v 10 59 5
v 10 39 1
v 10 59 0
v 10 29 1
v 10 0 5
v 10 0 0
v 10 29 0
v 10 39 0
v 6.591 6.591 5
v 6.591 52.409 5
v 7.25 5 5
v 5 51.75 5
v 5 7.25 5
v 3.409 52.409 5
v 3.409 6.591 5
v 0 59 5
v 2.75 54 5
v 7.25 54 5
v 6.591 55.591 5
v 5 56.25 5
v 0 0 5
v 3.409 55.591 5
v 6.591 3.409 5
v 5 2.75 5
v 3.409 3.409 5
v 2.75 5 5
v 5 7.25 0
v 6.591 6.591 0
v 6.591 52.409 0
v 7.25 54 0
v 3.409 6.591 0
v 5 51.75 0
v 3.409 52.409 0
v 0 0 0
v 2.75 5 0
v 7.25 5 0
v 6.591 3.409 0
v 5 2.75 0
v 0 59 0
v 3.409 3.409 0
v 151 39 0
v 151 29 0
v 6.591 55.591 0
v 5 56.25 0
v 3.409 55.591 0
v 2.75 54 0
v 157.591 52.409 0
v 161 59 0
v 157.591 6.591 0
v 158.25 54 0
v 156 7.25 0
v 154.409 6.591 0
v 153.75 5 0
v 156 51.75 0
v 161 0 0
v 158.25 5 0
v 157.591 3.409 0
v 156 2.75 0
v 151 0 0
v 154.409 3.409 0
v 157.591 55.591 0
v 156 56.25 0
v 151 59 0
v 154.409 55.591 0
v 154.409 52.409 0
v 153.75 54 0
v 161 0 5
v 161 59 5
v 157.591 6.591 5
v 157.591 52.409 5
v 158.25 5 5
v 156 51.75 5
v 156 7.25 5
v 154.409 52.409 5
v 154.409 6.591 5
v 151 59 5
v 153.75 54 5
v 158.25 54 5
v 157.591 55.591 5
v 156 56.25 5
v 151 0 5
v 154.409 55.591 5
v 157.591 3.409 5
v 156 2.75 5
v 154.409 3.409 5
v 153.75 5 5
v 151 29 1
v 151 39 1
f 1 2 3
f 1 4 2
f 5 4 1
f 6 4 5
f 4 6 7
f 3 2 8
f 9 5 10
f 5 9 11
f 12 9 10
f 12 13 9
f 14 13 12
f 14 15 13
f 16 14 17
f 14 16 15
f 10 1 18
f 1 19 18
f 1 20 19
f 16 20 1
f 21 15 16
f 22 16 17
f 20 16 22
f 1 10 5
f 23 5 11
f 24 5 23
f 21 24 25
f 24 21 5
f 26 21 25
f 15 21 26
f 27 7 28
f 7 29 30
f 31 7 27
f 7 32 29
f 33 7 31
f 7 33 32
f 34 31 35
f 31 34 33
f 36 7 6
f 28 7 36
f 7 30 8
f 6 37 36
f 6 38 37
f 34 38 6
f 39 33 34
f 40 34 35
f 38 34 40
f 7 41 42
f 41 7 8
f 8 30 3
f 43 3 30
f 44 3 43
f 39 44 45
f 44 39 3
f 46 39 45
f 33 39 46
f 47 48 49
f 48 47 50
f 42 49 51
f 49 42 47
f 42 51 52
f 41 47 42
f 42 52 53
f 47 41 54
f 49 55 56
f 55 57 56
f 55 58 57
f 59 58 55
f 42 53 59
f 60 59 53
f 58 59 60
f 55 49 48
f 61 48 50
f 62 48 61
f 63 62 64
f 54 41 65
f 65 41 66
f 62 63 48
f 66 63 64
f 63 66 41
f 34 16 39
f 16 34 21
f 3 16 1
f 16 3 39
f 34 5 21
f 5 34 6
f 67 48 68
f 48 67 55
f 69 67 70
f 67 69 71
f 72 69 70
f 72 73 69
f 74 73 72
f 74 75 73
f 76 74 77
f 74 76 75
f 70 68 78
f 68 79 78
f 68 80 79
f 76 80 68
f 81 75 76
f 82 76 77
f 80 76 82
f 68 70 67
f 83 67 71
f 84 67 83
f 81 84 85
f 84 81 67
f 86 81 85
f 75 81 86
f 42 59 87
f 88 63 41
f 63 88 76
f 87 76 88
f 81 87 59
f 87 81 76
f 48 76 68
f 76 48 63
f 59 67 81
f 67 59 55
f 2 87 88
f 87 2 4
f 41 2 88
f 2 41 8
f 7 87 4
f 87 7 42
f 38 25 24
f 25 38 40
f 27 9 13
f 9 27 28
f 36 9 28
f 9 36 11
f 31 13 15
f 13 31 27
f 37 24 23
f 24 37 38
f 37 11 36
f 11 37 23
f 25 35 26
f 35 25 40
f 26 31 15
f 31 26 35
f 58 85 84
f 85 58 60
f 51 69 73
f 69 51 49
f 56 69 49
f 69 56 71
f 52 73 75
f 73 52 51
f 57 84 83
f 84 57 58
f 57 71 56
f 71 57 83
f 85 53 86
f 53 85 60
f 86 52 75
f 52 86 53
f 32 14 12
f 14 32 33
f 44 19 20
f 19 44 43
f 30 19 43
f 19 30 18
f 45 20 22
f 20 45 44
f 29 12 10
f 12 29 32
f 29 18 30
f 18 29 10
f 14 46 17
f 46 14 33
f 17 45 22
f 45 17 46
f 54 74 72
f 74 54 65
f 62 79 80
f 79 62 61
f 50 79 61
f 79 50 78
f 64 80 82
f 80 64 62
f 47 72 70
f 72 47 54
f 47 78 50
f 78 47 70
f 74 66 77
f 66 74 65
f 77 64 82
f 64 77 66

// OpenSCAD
// Mounting depth -- distance from the top of the power supply to the center of the mounting holes.
depth = 39;

// Mounting hole horizontal separation, center to center
separation = 151;

// Mounting hole screw size
hole_size = 4.5;

// Extrusion height
extrusion_height = 20;

// How thick to make the uprights that hold the weight
upright_thickness = 5;

// How wide to make the uprights that hold the weight
upright_width = 10;

// How thick to make the runner that holds the spacing
runner_thickness = 1;

// How wide to make the runner that holds the spacing
runner_width = 10;

// ------------- END PARAMETERS -----------------

height = depth + (extrusion_height / 2) + 10;
width = separation + 10;

x0 = upright_width / 2;
y0 = 5;

difference() 
{
    union() 
    {
        cube([upright_width, height, upright_thickness]);
    
        translate([separation, 0, 0])
        cube([upright_width, height, upright_thickness]);

        translate([0, depth - 10, 0])
        cube([width, runner_width ,runner_thickness]);
    }

    translate([x0, y0, -1]) 
    cylinder(r = hole_size / 2, h = upright_thickness + 2);

    translate([x0 + separation, y0, -1]) 
    cylinder(r = hole_size / 2, h = upright_thickness + 2);

    translate([x0, y0 + height - 10, -1])
    cylinder(r = hole_size / 2, h = upright_thickness + 2);

    translate([x0 + separation, y0 + height - 10, -1]) 
    cylinder(r = hole_size / 2, h = upright_thickness + 2);
}
